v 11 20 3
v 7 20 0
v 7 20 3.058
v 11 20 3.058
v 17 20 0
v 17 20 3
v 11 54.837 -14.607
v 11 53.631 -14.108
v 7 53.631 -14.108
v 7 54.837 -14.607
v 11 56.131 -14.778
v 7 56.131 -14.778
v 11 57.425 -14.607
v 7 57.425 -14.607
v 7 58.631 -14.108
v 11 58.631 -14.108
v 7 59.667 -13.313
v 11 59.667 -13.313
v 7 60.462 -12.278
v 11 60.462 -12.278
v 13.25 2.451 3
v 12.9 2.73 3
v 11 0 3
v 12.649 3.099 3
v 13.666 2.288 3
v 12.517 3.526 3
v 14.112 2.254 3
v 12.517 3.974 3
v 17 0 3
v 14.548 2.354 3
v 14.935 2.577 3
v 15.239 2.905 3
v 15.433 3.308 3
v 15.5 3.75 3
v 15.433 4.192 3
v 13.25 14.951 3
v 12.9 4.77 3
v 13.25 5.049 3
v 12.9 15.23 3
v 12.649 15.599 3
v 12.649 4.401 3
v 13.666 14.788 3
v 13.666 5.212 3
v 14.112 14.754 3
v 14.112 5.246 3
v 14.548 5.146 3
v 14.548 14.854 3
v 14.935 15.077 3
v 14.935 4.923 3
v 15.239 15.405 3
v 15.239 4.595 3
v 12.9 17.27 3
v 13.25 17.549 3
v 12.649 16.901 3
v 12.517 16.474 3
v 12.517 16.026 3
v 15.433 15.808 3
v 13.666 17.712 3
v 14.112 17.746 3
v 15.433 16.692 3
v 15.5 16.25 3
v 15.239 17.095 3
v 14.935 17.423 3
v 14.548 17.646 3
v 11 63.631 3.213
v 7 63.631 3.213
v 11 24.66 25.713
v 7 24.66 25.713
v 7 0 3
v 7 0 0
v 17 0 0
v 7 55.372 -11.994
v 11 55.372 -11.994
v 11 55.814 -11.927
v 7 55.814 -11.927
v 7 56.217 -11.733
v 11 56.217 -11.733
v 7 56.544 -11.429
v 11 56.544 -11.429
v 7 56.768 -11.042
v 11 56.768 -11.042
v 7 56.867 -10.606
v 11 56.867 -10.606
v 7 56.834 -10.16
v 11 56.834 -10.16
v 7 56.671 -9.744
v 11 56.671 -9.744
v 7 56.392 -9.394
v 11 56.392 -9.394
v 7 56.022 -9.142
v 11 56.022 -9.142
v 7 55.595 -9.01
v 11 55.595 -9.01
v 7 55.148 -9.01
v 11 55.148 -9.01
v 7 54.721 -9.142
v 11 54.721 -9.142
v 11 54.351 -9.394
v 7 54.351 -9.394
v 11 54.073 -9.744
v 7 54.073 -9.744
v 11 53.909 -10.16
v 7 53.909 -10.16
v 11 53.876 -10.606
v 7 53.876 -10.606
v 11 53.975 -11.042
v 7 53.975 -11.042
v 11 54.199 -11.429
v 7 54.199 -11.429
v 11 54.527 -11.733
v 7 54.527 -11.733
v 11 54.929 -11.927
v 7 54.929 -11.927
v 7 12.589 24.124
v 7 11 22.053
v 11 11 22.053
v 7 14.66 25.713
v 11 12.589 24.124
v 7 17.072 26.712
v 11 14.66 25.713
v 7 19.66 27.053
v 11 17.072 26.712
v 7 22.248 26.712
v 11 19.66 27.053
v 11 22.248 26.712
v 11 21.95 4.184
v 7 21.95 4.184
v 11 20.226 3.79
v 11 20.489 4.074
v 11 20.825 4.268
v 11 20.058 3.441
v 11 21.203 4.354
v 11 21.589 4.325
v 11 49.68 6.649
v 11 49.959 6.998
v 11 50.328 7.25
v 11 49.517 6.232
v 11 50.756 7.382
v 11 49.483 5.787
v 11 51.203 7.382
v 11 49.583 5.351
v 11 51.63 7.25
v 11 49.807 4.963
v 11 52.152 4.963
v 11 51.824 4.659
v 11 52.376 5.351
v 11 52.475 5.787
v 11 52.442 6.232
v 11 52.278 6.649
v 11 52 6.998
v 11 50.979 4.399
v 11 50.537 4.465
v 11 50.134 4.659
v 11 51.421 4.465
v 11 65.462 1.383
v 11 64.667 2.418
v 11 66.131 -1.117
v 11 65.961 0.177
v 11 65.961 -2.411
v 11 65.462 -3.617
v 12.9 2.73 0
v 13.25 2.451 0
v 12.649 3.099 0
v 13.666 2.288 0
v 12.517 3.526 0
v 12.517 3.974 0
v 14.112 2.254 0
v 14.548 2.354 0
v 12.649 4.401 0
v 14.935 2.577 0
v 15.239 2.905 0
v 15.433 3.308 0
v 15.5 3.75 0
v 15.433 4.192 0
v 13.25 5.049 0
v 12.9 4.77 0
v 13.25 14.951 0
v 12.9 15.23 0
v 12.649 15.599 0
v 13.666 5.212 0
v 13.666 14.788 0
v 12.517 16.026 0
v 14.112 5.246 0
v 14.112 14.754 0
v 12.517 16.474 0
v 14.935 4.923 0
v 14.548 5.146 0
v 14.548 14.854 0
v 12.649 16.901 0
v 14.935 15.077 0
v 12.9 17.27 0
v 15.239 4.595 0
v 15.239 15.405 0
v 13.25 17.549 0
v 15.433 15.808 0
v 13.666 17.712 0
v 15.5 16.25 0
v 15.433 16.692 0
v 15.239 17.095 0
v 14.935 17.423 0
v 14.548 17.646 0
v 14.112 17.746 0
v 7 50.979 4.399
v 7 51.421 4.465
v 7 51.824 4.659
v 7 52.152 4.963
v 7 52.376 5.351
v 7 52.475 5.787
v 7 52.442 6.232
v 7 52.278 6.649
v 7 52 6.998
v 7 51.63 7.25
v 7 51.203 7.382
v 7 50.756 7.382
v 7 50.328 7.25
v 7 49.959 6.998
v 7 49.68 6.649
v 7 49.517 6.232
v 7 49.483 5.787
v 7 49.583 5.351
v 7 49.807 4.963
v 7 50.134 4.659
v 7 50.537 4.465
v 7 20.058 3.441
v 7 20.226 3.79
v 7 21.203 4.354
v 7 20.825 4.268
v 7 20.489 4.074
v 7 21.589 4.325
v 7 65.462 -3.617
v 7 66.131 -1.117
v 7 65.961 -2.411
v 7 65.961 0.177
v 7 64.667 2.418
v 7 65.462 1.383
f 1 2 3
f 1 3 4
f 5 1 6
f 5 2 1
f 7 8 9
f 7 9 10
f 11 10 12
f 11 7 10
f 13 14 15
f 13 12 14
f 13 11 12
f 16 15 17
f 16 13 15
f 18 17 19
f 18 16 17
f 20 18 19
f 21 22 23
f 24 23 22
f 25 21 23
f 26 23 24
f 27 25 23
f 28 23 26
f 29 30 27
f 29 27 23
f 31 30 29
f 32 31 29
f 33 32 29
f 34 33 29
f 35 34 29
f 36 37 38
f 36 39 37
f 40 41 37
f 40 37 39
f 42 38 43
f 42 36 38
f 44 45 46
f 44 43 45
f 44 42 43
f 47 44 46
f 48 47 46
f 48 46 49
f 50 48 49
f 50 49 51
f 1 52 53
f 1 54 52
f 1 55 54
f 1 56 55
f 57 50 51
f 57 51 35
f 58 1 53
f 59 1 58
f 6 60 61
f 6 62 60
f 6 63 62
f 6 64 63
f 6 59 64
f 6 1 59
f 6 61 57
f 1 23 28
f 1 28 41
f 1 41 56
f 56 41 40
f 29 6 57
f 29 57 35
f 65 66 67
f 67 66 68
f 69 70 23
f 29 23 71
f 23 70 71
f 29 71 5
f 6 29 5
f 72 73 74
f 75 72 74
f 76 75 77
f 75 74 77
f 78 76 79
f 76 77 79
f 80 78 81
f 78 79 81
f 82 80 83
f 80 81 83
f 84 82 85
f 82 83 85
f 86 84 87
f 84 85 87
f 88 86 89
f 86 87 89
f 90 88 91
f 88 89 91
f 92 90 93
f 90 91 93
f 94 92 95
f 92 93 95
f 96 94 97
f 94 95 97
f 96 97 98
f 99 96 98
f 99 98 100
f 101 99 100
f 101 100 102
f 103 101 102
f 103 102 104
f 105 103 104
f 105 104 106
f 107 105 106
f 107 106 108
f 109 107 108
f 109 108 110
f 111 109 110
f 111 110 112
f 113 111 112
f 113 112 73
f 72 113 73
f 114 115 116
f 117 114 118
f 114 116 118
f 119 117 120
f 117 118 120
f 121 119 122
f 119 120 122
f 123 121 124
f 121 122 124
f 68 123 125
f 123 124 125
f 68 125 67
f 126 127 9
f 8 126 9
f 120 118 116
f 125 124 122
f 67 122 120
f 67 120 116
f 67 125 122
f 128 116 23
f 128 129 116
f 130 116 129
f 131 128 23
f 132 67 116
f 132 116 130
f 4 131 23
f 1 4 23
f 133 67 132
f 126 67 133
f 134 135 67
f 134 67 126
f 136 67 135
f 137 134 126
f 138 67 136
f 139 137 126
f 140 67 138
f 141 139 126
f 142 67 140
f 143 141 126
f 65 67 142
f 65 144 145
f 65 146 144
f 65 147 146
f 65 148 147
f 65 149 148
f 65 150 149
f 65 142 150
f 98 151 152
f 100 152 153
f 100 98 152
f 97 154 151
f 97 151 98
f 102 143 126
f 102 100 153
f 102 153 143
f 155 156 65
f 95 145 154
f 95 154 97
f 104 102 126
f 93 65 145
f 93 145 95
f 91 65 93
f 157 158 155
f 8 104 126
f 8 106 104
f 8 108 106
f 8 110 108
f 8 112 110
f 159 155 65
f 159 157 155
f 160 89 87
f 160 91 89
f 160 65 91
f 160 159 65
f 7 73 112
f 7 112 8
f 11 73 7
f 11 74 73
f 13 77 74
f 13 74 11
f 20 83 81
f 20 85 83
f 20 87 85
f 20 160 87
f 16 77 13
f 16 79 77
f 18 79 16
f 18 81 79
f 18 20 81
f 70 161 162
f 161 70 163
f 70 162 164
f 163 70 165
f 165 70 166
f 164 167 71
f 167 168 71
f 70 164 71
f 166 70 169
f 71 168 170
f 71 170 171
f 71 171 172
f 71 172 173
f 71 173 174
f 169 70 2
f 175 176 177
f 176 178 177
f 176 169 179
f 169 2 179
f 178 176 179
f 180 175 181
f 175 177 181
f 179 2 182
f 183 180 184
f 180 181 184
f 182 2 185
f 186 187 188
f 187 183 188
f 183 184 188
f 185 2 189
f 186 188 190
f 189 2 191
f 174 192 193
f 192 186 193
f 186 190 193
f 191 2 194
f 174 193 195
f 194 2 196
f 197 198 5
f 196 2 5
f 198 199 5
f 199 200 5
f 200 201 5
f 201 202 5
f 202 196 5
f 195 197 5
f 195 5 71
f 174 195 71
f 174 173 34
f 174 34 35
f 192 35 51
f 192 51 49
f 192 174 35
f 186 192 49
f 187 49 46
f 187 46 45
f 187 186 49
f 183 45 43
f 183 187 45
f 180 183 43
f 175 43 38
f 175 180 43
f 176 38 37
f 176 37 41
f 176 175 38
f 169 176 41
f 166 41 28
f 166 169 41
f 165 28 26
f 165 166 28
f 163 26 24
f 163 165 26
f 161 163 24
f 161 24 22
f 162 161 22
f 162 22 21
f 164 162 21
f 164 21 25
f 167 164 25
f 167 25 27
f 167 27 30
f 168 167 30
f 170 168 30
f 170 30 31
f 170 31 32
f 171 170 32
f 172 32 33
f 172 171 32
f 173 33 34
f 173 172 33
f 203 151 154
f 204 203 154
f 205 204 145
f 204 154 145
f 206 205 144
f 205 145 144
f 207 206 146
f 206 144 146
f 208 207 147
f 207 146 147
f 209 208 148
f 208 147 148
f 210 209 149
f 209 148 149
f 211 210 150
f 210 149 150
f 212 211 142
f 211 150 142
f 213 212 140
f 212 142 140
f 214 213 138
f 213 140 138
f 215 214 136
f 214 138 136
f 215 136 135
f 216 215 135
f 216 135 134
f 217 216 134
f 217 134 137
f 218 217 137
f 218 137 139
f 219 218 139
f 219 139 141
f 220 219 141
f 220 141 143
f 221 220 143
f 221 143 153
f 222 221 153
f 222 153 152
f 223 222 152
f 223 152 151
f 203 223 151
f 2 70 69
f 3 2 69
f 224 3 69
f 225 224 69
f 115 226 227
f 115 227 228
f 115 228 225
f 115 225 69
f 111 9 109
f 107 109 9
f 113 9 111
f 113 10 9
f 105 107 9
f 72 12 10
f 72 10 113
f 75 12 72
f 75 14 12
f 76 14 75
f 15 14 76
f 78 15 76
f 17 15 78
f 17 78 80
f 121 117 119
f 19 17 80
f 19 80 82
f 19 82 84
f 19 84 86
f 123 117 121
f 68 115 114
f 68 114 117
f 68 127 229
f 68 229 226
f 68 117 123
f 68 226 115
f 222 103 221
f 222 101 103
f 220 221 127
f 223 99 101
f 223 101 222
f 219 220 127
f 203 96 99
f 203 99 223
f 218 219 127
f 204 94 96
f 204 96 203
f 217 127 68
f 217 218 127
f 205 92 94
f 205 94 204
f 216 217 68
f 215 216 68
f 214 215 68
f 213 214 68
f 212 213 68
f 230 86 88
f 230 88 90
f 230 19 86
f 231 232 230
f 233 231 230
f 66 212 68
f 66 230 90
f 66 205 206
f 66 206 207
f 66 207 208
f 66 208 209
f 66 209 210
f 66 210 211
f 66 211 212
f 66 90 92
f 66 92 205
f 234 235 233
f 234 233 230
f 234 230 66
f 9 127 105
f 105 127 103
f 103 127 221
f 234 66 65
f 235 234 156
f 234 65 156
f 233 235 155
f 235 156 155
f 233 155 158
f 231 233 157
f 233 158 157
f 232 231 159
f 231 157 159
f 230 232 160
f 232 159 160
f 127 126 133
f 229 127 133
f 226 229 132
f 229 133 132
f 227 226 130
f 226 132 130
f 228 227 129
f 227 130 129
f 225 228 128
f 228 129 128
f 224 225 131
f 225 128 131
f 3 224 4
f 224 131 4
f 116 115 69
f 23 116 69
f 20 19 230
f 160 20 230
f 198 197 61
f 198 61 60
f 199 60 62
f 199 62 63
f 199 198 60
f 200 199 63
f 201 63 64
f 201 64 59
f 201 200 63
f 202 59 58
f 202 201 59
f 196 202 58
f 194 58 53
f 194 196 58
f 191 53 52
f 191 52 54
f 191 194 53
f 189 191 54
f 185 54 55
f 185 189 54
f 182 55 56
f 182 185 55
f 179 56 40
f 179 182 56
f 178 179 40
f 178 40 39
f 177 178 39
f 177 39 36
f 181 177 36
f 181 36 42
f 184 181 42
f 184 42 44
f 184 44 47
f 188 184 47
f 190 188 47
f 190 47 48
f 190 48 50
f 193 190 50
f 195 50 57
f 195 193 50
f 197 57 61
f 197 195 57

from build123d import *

# Parameters (mm, degrees)
SKETCH_1_W          = 17
SKETCH_1_H          = 20
SKETCH_1_R          = 1.5
EXTRUDE_1_DEPTH     = 3
EXTRUDE_2_DEPTH     = 5
SKETCH_4_R          = 1.5
CUT_EXTRUDE_1_DEPTH = 5
FILLET_2_R          = 5
FILLET_3_R          = 1.3
FILLET_4_R          = 10
SKETCH_5_W          = 6
SKETCH_5_H          = 20
CUT_EXTRUDE_2_DEPTH = 10
SKETCH_6_R          = 1.5
CUT_EXTRUDE_3_DEPTH = 1


with BuildPart() as part:
    # 草图1 → 凸台-拉伸1 (new body)
    with BuildSketch(Plane.XY):
        with Locations((8.5, 10)):
            Rectangle(SKETCH_1_W, SKETCH_1_H)
        with Locations((3, 16.25)):
            Circle(SKETCH_1_R, mode=Mode.SUBTRACT)
        with Locations((14, 16.25)):
            Circle(SKETCH_1_R, mode=Mode.SUBTRACT)
        with Locations((14, 3.75)):
            Circle(SKETCH_1_R, mode=Mode.SUBTRACT)
        with Locations((3, 3.75)):
            Circle(SKETCH_1_R, mode=Mode.SUBTRACT)
    extrude(amount=EXTRUDE_1_DEPTH)

    # 草图3 → 凸台-拉伸2 (add)
    with BuildSketch(Plane.ZY.offset(-6)):
        Polygon((3, 20), (5.309401077, 20), (-16.607695155, 57.961524227), (0.712812921, 67.961524227), (30.712812921, 16), (3, 0), align=None)
    extrude(amount=-EXTRUDE_2_DEPTH)

    # 草图4 → 切除-拉伸1 (cut)
    with BuildSketch(Plane(origin=(11, 0, 0), x_dir=(0, 0, -1), z_dir=(1, 0, 0))):
        with Locations((-5.898711306, 50.979284742)):
            Circle(SKETCH_4_R)
        with Locations((10.493593539, 55.371589587)):
            Circle(SKETCH_4_R)
    extrude(amount=-CUT_EXTRUDE_1_DEPTH, mode=Mode.SUBTRACT)

    # 圆角2
    fillet_2_edges = [part.edges().sort_by_distance(p)[0] for p in [
        (8.5, 57.961524227, -16.607695155),
        (8.5, 67.961524227, 0.712812921),
    ]]
    fillet(fillet_2_edges, radius=FILLET_2_R)

    # 圆角3
    fillet_3_edges = [part.edges().sort_by_distance(p)[0] for p in [
        (8.5, 20, 5.309401077),
    ]]
    fillet(fillet_3_edges, radius=FILLET_3_R)

    # 圆角4
    fillet_4_edges = [part.edges().sort_by_distance(p)[0] for p in [
        (8.5, 16, 30.712812921),
    ]]
    fillet(fillet_4_edges, radius=FILLET_4_R)

    # 草图5 → 切除-拉伸2 (cut)
    with BuildSketch(Plane.XY.offset(3)):
        with Locations((3, 10)):
            Rectangle(SKETCH_5_W, SKETCH_5_H)
    extrude(amount=-CUT_EXTRUDE_2_DEPTH, mode=Mode.SUBTRACT)

    # 草图6 → 切除-拉伸3 (cut)
    with BuildSketch(Plane.ZY.offset(-6)):
        with BuildLine():
            Line((3, 0), (22.052558883, 11))
            ThreePointArc((22.052558883, 11), (26.711817146, 17.072063587), (25.712812921, 24.660254038))
            Line((25.712812921, 24.660254038), (3.212812921, 63.631397208))
            ThreePointArc((3.212812921, 63.631397208), (0.176781128, 65.96102634), (-3.617314098, 65.461524227))
            Line((-3.617314098, 65.461524227), (-12.277568136, 60.461524227))
            ThreePointArc((-12.277568136, 60.461524227), (-14.607197267, 57.425492434), (-14.107695155, 53.631397208))
            Line((-14.107695155, 53.631397208), (4.183568052, 21.95))
            ThreePointArc((4.183568052, 21.95), (4.183568052, 20.65), (3.057735027, 20))
            Line((3.057735027, 20), (0, 20))
            Line((0, 20), (0, 0))
            Line((0, 0), (3, 0))
        make_face()
        with Locations((5.898711306, 50.979284742)):
            Circle(SKETCH_6_R, mode=Mode.SUBTRACT)
        with Locations((-10.493593539, 55.371589587)):
            Circle(SKETCH_6_R, mode=Mode.SUBTRACT)
    extrude(amount=-CUT_EXTRUDE_3_DEPTH, mode=Mode.SUBTRACT)


solid = part.part
